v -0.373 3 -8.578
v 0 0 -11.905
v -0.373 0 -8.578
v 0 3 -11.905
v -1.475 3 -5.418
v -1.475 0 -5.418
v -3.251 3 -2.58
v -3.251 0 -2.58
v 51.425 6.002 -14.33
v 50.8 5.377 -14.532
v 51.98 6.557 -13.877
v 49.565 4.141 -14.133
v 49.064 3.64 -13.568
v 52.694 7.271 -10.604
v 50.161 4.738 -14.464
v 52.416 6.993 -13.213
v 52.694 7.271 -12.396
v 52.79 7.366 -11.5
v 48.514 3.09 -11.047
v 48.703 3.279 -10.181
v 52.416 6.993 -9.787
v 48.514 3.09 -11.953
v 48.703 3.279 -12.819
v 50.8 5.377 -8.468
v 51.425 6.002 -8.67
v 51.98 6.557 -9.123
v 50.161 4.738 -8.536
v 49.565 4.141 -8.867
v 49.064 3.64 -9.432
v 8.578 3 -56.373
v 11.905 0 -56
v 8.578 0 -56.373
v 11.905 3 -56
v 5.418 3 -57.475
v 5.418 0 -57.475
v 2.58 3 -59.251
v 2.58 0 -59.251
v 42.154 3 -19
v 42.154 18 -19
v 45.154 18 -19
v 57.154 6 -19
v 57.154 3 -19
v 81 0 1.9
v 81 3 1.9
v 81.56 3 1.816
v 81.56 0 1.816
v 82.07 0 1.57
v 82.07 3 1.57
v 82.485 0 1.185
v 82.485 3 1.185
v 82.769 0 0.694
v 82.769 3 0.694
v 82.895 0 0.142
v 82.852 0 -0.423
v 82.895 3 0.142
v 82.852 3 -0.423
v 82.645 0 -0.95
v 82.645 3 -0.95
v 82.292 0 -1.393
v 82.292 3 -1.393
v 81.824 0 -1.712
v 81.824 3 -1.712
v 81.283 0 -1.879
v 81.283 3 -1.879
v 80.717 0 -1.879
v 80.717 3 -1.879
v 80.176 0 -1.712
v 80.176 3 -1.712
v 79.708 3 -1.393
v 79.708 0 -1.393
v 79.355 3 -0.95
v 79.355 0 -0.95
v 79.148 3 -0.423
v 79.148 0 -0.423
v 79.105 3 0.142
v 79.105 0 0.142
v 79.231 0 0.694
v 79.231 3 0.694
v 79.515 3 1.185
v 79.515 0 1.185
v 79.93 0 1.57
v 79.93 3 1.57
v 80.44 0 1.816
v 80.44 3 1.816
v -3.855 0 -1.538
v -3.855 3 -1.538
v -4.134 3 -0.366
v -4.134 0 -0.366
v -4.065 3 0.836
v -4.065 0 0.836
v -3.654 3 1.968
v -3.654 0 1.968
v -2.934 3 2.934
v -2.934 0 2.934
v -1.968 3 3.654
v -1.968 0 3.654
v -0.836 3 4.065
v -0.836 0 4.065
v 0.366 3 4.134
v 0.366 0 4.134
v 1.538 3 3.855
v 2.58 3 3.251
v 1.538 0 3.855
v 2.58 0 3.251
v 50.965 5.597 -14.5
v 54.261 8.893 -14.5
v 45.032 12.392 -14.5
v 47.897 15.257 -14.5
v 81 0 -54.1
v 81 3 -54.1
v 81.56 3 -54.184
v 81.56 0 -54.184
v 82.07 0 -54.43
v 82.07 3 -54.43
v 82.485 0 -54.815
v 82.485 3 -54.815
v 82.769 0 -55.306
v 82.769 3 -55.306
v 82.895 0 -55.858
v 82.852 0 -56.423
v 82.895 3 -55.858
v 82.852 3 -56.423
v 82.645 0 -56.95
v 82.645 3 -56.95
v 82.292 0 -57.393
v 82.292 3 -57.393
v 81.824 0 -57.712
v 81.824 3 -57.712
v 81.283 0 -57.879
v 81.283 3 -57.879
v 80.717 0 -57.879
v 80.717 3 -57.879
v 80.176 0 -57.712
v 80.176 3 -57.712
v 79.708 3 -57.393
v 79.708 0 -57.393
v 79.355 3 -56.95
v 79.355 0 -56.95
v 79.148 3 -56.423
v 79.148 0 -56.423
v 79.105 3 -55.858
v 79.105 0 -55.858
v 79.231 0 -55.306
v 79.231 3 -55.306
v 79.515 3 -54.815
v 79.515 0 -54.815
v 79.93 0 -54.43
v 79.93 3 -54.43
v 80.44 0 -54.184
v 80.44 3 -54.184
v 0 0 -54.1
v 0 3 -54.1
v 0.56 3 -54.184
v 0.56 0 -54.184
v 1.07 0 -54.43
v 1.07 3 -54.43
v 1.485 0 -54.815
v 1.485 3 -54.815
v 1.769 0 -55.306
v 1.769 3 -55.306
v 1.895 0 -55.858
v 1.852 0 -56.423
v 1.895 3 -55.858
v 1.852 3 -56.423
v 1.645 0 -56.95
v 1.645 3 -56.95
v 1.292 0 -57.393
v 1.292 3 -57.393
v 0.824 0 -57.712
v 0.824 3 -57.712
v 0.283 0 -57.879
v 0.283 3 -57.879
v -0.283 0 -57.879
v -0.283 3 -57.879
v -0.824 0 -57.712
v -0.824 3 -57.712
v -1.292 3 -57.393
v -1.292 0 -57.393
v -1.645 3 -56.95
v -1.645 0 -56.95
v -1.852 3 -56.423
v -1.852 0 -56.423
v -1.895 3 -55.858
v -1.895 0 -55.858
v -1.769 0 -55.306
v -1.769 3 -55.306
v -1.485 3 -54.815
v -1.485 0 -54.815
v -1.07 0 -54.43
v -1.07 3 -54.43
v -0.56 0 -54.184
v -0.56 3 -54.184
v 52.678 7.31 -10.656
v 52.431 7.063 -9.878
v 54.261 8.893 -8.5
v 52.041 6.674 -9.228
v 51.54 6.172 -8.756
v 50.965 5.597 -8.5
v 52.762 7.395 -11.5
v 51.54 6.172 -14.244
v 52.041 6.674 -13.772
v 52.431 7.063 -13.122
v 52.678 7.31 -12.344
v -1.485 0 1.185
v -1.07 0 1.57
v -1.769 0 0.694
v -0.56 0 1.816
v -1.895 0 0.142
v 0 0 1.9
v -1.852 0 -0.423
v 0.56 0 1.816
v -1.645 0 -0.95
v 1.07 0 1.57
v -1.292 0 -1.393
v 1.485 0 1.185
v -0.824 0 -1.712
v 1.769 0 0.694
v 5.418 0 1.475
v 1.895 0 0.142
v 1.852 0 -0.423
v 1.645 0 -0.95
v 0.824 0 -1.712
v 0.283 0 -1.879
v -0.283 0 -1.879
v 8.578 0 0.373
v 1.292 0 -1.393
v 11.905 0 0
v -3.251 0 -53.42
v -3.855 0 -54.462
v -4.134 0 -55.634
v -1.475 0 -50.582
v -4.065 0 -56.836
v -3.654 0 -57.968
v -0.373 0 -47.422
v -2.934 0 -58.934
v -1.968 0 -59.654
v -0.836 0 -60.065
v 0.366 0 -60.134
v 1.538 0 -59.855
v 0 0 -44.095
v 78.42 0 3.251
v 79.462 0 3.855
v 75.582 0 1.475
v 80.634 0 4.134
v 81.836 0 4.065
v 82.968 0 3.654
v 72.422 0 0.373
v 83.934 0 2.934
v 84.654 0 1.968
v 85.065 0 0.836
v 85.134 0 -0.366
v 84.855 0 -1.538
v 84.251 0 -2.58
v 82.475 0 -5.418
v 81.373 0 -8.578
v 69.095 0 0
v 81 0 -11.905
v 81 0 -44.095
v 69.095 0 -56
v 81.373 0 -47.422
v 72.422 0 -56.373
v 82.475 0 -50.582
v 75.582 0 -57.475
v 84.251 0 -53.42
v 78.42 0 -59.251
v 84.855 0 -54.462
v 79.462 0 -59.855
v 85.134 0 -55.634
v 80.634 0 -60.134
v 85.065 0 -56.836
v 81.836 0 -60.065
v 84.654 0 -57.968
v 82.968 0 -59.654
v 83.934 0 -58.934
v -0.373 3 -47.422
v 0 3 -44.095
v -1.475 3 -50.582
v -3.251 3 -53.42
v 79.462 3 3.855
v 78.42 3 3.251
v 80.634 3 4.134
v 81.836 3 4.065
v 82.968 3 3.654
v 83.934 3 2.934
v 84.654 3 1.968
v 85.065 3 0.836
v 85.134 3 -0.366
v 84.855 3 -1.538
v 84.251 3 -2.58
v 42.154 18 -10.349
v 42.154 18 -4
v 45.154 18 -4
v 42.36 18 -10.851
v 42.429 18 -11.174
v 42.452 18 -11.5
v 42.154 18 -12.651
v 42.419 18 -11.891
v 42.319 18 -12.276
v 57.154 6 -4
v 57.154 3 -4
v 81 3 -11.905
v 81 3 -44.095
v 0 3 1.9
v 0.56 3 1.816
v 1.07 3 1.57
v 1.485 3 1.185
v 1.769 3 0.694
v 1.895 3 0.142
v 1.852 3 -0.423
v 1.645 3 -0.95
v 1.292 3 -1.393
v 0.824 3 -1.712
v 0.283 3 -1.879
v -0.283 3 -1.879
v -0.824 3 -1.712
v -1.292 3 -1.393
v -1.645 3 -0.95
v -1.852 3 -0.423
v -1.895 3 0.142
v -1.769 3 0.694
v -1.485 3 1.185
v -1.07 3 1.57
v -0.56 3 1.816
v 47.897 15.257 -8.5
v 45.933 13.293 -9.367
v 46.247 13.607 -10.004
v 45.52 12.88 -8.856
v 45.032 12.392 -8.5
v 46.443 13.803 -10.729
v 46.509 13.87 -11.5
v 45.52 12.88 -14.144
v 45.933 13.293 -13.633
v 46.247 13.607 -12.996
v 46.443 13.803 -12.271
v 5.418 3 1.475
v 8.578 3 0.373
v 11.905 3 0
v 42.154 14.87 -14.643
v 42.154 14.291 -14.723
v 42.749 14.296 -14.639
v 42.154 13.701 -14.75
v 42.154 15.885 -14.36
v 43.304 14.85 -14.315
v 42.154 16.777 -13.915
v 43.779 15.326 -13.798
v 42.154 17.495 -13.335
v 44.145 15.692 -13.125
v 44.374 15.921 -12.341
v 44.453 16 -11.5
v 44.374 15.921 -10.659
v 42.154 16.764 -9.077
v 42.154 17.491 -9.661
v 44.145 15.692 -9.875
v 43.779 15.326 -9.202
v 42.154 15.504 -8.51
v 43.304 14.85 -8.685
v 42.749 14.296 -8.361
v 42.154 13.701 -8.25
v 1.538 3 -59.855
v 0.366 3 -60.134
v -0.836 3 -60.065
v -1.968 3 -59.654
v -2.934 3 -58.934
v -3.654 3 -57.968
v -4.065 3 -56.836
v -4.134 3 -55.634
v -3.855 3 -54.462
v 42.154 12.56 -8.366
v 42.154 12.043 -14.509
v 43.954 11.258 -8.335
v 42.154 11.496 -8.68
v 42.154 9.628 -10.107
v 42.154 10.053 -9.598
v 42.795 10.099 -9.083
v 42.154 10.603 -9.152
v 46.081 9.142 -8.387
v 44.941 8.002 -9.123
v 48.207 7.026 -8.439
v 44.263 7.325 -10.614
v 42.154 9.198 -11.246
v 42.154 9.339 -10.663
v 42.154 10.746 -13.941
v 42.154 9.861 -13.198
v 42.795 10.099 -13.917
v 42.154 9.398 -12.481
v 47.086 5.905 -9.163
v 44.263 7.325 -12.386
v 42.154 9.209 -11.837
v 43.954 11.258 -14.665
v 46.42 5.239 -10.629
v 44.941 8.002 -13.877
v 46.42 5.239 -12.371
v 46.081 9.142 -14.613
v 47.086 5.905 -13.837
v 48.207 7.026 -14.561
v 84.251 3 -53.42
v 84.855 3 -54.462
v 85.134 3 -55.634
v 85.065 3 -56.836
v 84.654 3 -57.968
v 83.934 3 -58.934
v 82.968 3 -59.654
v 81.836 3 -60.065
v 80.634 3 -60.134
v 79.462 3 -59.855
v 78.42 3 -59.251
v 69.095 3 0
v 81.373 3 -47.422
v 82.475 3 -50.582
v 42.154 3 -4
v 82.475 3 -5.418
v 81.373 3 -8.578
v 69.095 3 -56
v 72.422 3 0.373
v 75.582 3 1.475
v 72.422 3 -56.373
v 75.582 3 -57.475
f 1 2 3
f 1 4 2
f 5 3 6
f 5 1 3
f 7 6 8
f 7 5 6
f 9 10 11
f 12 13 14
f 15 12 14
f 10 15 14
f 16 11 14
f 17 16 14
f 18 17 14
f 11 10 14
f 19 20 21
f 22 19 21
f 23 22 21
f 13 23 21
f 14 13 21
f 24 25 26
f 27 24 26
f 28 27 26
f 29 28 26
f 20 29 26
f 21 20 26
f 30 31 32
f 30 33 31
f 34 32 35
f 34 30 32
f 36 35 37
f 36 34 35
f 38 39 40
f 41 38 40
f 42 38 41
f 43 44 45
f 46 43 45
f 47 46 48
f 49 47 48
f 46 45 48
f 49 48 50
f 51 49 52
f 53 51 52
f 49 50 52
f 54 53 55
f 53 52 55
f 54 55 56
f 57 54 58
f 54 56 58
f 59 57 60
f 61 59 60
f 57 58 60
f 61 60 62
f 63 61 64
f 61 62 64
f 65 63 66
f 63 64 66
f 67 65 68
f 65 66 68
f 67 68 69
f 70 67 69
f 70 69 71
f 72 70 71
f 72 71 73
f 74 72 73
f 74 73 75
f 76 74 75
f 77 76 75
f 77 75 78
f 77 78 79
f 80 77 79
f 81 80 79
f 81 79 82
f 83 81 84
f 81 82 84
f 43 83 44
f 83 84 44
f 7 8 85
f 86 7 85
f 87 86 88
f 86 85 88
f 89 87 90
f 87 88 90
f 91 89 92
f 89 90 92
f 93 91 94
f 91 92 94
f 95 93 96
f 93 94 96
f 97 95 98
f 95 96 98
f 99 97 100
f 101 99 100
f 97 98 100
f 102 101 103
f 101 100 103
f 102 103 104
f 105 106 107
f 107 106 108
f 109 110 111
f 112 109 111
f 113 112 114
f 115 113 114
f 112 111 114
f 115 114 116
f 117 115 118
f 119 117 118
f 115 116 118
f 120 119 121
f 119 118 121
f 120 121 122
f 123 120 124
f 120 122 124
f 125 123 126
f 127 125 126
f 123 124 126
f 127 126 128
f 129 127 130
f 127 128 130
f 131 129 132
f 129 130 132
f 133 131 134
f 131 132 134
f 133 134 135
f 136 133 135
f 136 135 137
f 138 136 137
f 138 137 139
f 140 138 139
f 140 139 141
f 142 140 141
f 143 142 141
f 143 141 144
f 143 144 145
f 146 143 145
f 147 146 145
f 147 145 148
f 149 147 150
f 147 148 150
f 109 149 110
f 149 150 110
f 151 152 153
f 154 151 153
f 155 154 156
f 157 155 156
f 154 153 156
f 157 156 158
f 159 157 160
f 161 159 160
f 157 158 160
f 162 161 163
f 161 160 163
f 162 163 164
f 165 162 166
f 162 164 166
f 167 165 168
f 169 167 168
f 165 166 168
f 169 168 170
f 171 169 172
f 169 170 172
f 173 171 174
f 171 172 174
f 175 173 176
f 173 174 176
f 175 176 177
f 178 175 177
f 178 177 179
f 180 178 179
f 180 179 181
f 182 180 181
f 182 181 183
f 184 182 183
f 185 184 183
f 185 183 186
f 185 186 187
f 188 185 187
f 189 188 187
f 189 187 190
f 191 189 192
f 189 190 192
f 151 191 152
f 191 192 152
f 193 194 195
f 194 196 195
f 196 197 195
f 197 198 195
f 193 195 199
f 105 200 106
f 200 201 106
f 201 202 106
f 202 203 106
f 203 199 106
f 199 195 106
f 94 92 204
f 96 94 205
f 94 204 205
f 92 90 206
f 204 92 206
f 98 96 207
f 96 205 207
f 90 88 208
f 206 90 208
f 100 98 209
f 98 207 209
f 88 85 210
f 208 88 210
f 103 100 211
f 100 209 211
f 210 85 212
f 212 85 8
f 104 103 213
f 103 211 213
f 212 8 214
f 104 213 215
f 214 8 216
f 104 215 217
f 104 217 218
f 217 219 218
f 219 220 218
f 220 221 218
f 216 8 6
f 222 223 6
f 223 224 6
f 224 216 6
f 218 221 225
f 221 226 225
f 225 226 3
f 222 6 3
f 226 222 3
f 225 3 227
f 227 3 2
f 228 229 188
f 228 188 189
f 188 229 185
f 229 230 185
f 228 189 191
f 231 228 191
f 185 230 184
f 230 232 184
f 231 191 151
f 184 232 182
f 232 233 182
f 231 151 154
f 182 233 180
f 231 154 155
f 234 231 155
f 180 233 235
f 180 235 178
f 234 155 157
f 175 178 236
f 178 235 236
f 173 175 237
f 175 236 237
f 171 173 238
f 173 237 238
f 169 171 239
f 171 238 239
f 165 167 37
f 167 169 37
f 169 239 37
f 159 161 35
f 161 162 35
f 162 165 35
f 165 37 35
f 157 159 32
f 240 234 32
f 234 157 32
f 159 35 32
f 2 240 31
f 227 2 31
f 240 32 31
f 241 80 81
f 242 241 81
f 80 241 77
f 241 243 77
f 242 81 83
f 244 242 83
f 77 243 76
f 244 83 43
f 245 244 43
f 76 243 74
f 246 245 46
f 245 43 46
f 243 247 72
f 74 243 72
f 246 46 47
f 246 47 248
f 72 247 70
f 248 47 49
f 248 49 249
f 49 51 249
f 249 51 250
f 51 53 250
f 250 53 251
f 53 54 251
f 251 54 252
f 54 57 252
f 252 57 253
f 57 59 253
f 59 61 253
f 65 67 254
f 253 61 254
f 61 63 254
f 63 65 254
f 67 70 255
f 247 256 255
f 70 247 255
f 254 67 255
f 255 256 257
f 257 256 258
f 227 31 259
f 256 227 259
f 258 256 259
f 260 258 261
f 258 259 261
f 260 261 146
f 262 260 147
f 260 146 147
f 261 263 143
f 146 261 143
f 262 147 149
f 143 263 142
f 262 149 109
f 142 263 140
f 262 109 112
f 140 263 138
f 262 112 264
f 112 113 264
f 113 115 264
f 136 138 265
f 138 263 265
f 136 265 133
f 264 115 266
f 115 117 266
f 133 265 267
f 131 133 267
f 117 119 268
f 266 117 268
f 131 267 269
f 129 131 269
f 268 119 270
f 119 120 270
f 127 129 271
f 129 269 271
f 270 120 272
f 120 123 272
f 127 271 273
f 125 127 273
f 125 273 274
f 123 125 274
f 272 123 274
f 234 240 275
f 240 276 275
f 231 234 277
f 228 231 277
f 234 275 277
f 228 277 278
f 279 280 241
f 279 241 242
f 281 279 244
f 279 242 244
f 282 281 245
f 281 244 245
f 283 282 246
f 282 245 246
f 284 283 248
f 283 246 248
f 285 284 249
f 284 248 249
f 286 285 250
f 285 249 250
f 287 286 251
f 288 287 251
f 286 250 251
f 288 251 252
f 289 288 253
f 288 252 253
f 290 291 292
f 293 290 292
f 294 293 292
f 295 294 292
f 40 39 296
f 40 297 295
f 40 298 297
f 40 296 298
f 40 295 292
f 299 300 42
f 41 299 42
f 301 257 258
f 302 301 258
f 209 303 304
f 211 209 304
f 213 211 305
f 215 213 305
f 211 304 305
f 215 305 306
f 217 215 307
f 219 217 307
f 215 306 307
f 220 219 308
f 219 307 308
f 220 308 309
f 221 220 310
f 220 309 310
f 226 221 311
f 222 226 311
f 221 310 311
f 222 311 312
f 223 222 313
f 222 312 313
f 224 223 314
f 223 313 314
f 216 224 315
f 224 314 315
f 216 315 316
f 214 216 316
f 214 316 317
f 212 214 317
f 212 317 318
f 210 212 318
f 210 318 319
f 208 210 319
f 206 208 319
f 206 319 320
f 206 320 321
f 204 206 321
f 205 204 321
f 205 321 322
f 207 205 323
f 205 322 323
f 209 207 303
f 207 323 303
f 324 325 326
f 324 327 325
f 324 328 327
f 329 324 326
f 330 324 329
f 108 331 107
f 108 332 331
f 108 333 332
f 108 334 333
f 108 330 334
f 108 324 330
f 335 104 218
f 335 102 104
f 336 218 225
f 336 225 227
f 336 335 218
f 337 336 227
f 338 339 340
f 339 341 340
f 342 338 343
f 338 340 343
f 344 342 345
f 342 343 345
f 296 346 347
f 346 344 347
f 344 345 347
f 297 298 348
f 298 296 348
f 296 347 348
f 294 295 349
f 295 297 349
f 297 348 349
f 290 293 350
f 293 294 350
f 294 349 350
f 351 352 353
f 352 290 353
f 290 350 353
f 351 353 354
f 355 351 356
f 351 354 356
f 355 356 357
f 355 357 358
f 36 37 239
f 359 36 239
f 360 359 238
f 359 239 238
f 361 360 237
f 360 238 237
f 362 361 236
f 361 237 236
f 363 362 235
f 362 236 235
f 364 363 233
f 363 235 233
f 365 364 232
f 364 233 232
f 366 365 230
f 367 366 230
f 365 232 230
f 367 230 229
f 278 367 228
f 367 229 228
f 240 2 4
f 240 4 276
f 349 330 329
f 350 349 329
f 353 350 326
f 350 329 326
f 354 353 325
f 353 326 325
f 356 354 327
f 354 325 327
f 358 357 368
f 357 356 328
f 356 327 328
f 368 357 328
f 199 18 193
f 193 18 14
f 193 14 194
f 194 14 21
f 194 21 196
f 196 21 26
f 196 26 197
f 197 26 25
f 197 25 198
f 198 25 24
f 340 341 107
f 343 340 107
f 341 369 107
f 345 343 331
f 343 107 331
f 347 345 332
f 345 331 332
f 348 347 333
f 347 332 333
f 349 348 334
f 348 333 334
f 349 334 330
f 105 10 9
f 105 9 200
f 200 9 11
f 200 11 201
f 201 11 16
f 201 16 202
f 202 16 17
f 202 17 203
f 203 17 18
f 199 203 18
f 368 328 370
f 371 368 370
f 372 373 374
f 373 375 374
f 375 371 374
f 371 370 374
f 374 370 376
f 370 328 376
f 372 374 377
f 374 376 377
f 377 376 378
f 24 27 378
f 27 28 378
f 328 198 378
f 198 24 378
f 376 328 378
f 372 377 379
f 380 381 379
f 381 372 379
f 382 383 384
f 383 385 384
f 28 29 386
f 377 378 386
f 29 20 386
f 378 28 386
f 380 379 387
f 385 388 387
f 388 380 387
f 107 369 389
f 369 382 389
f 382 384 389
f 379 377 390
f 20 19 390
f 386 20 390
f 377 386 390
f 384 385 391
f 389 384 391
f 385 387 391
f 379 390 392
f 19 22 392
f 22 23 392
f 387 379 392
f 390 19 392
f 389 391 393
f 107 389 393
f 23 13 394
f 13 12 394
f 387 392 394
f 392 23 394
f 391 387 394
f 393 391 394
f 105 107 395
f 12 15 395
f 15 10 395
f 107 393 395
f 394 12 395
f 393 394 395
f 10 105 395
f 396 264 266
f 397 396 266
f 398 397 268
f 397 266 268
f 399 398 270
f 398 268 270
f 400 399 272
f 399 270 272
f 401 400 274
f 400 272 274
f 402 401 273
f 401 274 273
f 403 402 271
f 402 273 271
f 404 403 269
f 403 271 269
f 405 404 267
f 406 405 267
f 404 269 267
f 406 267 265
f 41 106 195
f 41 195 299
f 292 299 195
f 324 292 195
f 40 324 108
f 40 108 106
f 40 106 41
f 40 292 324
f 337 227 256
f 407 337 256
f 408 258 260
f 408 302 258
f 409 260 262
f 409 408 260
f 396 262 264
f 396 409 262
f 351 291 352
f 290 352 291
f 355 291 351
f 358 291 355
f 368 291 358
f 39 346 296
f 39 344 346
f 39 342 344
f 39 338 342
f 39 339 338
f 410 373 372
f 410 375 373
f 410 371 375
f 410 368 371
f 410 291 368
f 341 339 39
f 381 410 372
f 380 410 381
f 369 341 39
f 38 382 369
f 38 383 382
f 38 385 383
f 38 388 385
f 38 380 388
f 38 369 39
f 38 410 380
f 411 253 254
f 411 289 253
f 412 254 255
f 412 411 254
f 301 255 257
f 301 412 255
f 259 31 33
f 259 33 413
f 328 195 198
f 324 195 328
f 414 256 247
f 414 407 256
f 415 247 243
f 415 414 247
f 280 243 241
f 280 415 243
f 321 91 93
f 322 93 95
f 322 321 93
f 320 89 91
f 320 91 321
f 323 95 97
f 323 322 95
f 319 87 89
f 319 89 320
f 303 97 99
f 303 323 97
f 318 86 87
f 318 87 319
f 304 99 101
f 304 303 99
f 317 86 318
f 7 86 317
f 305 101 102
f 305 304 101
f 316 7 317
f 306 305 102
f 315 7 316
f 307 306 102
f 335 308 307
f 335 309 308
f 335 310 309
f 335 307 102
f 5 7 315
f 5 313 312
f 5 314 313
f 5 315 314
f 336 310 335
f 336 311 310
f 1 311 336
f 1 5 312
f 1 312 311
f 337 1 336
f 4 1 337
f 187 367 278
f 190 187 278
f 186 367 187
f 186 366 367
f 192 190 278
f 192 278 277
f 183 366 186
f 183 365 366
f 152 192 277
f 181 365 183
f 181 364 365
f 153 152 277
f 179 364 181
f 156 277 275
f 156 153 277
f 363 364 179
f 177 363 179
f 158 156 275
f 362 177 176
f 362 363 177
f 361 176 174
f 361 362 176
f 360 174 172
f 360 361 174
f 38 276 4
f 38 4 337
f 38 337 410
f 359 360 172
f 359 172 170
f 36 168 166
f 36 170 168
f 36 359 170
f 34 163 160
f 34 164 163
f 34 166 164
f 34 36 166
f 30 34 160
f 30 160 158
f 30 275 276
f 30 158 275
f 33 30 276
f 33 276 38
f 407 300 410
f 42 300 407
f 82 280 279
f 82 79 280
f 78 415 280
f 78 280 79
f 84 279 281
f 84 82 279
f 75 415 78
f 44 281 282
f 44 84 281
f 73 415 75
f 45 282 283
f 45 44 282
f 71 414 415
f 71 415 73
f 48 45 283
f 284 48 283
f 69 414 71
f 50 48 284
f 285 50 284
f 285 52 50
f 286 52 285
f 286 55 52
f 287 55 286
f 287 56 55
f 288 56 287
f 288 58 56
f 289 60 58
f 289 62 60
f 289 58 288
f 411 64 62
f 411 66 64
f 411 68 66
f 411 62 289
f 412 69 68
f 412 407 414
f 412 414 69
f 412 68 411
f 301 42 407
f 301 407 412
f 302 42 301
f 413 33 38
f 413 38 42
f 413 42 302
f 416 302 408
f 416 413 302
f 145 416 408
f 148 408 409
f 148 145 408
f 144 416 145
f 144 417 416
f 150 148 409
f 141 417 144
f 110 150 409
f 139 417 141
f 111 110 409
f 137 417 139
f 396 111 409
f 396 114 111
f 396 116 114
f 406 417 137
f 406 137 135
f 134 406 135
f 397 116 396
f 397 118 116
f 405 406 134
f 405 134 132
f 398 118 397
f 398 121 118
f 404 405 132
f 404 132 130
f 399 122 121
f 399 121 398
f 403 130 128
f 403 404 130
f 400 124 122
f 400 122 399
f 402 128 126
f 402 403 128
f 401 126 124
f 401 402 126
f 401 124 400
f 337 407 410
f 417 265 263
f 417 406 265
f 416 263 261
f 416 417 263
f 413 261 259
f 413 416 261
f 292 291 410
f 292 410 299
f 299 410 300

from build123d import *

# Parameters (mm, degrees)
BOSS_EXTRUDE1_DEPTH     = 3
FILLET1_R               = 15
SKETCH2_R               = 1.9
CUT_EXTRUDE1_DEPTH      = 3
SKETCH3_W               = 15
SKETCH3_H               = 15
BOSS_EXTRUDE2_DEPTH     = 15
CHAMFER1_SIZE           = 12
F_3DSKETCH1_R           = 3.25
CUT_EXTRUDE2_DEPTH      = 12
CUT_EXTRUDE2_TAPER      = 1
CUT_EXTRUDE2_DEPTH_BACK = 12
SKETCH4_W               = 6
SKETCH4_H               = 9
CUT_EXTRUDE3_DEPTH      = 5


with BuildPart() as part:
    # Sketch1 → Boss-Extrude1 (new body)
    with BuildSketch(Plane(origin=(0, 0, 0), x_dir=(1, 0, 0), z_dir=(0, 1, 0))):
        with BuildLine():
            ThreePointArc((0, 4.15), (-2.934493142, -2.934493142), (4.15, 0))
            Line((4.15, 0), (76.85, 0))
            ThreePointArc((76.85, 0), (83.934493142, -2.934493142), (81, 4.15))
            Line((81, 4.15), (81, 51.85))
            ThreePointArc((81, 51.85), (83.934493142, 58.934493142), (76.85, 56))
            Line((76.85, 56), (4.15, 56))
            ThreePointArc((4.15, 56), (-2.934493142, 58.934493142), (0, 51.85))
            Line((0, 51.85), (0, 4.15))
        make_face()
    extrude(amount=BOSS_EXTRUDE1_DEPTH)

    # Fillet1
    fillet1_edges = [part.edges().sort_by_distance(p)[0] for p in [
        (0, 1.5, -51.85),
        (4.15, 1.5, -56),
        (76.85, 1.5, -56),
        (81, 1.5, -51.85),
        (81, 1.5, -4.15),
        (76.85, 1.5, 0),
        (0, 1.5, -4.15),
        (4.15, 1.5, 0),
    ]]
    fillet(fillet1_edges, radius=FILLET1_R)

    # Sketch2 → Cut-Extrude1 (cut)
    with BuildSketch(Plane(origin=(0, 3, 0), x_dir=(1, 0, 0), z_dir=(0, 1, 0))):
        with Locations((0, 56)):
            Circle(SKETCH2_R)
        with Locations((81, 56)):
            Circle(SKETCH2_R)
        with Locations((81, 0)):
            Circle(SKETCH2_R)
        Circle(SKETCH2_R)
    extrude(amount=-CUT_EXTRUDE1_DEPTH, mode=Mode.SUBTRACT)

    # Sketch3 → Boss-Extrude2 (add)
    with BuildSketch(Plane(origin=(0, 3, 0), x_dir=(1, 0, 0), z_dir=(0, 1, 0))):
        with Locations((49.654495899, 11.5)):
            Rectangle(SKETCH3_W, SKETCH3_H)
    extrude(amount=BOSS_EXTRUDE2_DEPTH)

    # Chamfer1
    chamfer1_edges = [part.edges().sort_by_distance(p)[0] for p in [
        (57.154495899, 18, -11.5),
    ]]
    chamfer(chamfer1_edges, length=CHAMFER1_SIZE)

    # 3DSketch1 → Cut-Extrude2 (cut, two sides)
    with BuildSketch(Plane(origin=(42.154495899, 13.701446828, -11.5), x_dir=(0, 0, -1), z_dir=(0.7071067811865464, -0.7071067811865488, 0))) as cut_extrude2_sk:
        Circle(F_3DSKETCH1_R)
    extrude(amount=CUT_EXTRUDE2_DEPTH, taper=CUT_EXTRUDE2_TAPER, mode=Mode.SUBTRACT)
    extrude(cut_extrude2_sk.sketch, amount=-CUT_EXTRUDE2_DEPTH_BACK, mode=Mode.SUBTRACT)

    # Sketch4 → Cut-Extrude3 (cut)
    with BuildSketch(Plane(origin=(31.57724795, 31.57724795, 0), x_dir=(0, 0, -1), z_dir=(0.7071067811865487, 0.7071067811865465, 0))):
        with Locations((11.5, -27.579807846)):
            Rectangle(SKETCH4_W, SKETCH4_H)
    extrude(amount=-CUT_EXTRUDE3_DEPTH, mode=Mode.SUBTRACT)


solid = part.part
